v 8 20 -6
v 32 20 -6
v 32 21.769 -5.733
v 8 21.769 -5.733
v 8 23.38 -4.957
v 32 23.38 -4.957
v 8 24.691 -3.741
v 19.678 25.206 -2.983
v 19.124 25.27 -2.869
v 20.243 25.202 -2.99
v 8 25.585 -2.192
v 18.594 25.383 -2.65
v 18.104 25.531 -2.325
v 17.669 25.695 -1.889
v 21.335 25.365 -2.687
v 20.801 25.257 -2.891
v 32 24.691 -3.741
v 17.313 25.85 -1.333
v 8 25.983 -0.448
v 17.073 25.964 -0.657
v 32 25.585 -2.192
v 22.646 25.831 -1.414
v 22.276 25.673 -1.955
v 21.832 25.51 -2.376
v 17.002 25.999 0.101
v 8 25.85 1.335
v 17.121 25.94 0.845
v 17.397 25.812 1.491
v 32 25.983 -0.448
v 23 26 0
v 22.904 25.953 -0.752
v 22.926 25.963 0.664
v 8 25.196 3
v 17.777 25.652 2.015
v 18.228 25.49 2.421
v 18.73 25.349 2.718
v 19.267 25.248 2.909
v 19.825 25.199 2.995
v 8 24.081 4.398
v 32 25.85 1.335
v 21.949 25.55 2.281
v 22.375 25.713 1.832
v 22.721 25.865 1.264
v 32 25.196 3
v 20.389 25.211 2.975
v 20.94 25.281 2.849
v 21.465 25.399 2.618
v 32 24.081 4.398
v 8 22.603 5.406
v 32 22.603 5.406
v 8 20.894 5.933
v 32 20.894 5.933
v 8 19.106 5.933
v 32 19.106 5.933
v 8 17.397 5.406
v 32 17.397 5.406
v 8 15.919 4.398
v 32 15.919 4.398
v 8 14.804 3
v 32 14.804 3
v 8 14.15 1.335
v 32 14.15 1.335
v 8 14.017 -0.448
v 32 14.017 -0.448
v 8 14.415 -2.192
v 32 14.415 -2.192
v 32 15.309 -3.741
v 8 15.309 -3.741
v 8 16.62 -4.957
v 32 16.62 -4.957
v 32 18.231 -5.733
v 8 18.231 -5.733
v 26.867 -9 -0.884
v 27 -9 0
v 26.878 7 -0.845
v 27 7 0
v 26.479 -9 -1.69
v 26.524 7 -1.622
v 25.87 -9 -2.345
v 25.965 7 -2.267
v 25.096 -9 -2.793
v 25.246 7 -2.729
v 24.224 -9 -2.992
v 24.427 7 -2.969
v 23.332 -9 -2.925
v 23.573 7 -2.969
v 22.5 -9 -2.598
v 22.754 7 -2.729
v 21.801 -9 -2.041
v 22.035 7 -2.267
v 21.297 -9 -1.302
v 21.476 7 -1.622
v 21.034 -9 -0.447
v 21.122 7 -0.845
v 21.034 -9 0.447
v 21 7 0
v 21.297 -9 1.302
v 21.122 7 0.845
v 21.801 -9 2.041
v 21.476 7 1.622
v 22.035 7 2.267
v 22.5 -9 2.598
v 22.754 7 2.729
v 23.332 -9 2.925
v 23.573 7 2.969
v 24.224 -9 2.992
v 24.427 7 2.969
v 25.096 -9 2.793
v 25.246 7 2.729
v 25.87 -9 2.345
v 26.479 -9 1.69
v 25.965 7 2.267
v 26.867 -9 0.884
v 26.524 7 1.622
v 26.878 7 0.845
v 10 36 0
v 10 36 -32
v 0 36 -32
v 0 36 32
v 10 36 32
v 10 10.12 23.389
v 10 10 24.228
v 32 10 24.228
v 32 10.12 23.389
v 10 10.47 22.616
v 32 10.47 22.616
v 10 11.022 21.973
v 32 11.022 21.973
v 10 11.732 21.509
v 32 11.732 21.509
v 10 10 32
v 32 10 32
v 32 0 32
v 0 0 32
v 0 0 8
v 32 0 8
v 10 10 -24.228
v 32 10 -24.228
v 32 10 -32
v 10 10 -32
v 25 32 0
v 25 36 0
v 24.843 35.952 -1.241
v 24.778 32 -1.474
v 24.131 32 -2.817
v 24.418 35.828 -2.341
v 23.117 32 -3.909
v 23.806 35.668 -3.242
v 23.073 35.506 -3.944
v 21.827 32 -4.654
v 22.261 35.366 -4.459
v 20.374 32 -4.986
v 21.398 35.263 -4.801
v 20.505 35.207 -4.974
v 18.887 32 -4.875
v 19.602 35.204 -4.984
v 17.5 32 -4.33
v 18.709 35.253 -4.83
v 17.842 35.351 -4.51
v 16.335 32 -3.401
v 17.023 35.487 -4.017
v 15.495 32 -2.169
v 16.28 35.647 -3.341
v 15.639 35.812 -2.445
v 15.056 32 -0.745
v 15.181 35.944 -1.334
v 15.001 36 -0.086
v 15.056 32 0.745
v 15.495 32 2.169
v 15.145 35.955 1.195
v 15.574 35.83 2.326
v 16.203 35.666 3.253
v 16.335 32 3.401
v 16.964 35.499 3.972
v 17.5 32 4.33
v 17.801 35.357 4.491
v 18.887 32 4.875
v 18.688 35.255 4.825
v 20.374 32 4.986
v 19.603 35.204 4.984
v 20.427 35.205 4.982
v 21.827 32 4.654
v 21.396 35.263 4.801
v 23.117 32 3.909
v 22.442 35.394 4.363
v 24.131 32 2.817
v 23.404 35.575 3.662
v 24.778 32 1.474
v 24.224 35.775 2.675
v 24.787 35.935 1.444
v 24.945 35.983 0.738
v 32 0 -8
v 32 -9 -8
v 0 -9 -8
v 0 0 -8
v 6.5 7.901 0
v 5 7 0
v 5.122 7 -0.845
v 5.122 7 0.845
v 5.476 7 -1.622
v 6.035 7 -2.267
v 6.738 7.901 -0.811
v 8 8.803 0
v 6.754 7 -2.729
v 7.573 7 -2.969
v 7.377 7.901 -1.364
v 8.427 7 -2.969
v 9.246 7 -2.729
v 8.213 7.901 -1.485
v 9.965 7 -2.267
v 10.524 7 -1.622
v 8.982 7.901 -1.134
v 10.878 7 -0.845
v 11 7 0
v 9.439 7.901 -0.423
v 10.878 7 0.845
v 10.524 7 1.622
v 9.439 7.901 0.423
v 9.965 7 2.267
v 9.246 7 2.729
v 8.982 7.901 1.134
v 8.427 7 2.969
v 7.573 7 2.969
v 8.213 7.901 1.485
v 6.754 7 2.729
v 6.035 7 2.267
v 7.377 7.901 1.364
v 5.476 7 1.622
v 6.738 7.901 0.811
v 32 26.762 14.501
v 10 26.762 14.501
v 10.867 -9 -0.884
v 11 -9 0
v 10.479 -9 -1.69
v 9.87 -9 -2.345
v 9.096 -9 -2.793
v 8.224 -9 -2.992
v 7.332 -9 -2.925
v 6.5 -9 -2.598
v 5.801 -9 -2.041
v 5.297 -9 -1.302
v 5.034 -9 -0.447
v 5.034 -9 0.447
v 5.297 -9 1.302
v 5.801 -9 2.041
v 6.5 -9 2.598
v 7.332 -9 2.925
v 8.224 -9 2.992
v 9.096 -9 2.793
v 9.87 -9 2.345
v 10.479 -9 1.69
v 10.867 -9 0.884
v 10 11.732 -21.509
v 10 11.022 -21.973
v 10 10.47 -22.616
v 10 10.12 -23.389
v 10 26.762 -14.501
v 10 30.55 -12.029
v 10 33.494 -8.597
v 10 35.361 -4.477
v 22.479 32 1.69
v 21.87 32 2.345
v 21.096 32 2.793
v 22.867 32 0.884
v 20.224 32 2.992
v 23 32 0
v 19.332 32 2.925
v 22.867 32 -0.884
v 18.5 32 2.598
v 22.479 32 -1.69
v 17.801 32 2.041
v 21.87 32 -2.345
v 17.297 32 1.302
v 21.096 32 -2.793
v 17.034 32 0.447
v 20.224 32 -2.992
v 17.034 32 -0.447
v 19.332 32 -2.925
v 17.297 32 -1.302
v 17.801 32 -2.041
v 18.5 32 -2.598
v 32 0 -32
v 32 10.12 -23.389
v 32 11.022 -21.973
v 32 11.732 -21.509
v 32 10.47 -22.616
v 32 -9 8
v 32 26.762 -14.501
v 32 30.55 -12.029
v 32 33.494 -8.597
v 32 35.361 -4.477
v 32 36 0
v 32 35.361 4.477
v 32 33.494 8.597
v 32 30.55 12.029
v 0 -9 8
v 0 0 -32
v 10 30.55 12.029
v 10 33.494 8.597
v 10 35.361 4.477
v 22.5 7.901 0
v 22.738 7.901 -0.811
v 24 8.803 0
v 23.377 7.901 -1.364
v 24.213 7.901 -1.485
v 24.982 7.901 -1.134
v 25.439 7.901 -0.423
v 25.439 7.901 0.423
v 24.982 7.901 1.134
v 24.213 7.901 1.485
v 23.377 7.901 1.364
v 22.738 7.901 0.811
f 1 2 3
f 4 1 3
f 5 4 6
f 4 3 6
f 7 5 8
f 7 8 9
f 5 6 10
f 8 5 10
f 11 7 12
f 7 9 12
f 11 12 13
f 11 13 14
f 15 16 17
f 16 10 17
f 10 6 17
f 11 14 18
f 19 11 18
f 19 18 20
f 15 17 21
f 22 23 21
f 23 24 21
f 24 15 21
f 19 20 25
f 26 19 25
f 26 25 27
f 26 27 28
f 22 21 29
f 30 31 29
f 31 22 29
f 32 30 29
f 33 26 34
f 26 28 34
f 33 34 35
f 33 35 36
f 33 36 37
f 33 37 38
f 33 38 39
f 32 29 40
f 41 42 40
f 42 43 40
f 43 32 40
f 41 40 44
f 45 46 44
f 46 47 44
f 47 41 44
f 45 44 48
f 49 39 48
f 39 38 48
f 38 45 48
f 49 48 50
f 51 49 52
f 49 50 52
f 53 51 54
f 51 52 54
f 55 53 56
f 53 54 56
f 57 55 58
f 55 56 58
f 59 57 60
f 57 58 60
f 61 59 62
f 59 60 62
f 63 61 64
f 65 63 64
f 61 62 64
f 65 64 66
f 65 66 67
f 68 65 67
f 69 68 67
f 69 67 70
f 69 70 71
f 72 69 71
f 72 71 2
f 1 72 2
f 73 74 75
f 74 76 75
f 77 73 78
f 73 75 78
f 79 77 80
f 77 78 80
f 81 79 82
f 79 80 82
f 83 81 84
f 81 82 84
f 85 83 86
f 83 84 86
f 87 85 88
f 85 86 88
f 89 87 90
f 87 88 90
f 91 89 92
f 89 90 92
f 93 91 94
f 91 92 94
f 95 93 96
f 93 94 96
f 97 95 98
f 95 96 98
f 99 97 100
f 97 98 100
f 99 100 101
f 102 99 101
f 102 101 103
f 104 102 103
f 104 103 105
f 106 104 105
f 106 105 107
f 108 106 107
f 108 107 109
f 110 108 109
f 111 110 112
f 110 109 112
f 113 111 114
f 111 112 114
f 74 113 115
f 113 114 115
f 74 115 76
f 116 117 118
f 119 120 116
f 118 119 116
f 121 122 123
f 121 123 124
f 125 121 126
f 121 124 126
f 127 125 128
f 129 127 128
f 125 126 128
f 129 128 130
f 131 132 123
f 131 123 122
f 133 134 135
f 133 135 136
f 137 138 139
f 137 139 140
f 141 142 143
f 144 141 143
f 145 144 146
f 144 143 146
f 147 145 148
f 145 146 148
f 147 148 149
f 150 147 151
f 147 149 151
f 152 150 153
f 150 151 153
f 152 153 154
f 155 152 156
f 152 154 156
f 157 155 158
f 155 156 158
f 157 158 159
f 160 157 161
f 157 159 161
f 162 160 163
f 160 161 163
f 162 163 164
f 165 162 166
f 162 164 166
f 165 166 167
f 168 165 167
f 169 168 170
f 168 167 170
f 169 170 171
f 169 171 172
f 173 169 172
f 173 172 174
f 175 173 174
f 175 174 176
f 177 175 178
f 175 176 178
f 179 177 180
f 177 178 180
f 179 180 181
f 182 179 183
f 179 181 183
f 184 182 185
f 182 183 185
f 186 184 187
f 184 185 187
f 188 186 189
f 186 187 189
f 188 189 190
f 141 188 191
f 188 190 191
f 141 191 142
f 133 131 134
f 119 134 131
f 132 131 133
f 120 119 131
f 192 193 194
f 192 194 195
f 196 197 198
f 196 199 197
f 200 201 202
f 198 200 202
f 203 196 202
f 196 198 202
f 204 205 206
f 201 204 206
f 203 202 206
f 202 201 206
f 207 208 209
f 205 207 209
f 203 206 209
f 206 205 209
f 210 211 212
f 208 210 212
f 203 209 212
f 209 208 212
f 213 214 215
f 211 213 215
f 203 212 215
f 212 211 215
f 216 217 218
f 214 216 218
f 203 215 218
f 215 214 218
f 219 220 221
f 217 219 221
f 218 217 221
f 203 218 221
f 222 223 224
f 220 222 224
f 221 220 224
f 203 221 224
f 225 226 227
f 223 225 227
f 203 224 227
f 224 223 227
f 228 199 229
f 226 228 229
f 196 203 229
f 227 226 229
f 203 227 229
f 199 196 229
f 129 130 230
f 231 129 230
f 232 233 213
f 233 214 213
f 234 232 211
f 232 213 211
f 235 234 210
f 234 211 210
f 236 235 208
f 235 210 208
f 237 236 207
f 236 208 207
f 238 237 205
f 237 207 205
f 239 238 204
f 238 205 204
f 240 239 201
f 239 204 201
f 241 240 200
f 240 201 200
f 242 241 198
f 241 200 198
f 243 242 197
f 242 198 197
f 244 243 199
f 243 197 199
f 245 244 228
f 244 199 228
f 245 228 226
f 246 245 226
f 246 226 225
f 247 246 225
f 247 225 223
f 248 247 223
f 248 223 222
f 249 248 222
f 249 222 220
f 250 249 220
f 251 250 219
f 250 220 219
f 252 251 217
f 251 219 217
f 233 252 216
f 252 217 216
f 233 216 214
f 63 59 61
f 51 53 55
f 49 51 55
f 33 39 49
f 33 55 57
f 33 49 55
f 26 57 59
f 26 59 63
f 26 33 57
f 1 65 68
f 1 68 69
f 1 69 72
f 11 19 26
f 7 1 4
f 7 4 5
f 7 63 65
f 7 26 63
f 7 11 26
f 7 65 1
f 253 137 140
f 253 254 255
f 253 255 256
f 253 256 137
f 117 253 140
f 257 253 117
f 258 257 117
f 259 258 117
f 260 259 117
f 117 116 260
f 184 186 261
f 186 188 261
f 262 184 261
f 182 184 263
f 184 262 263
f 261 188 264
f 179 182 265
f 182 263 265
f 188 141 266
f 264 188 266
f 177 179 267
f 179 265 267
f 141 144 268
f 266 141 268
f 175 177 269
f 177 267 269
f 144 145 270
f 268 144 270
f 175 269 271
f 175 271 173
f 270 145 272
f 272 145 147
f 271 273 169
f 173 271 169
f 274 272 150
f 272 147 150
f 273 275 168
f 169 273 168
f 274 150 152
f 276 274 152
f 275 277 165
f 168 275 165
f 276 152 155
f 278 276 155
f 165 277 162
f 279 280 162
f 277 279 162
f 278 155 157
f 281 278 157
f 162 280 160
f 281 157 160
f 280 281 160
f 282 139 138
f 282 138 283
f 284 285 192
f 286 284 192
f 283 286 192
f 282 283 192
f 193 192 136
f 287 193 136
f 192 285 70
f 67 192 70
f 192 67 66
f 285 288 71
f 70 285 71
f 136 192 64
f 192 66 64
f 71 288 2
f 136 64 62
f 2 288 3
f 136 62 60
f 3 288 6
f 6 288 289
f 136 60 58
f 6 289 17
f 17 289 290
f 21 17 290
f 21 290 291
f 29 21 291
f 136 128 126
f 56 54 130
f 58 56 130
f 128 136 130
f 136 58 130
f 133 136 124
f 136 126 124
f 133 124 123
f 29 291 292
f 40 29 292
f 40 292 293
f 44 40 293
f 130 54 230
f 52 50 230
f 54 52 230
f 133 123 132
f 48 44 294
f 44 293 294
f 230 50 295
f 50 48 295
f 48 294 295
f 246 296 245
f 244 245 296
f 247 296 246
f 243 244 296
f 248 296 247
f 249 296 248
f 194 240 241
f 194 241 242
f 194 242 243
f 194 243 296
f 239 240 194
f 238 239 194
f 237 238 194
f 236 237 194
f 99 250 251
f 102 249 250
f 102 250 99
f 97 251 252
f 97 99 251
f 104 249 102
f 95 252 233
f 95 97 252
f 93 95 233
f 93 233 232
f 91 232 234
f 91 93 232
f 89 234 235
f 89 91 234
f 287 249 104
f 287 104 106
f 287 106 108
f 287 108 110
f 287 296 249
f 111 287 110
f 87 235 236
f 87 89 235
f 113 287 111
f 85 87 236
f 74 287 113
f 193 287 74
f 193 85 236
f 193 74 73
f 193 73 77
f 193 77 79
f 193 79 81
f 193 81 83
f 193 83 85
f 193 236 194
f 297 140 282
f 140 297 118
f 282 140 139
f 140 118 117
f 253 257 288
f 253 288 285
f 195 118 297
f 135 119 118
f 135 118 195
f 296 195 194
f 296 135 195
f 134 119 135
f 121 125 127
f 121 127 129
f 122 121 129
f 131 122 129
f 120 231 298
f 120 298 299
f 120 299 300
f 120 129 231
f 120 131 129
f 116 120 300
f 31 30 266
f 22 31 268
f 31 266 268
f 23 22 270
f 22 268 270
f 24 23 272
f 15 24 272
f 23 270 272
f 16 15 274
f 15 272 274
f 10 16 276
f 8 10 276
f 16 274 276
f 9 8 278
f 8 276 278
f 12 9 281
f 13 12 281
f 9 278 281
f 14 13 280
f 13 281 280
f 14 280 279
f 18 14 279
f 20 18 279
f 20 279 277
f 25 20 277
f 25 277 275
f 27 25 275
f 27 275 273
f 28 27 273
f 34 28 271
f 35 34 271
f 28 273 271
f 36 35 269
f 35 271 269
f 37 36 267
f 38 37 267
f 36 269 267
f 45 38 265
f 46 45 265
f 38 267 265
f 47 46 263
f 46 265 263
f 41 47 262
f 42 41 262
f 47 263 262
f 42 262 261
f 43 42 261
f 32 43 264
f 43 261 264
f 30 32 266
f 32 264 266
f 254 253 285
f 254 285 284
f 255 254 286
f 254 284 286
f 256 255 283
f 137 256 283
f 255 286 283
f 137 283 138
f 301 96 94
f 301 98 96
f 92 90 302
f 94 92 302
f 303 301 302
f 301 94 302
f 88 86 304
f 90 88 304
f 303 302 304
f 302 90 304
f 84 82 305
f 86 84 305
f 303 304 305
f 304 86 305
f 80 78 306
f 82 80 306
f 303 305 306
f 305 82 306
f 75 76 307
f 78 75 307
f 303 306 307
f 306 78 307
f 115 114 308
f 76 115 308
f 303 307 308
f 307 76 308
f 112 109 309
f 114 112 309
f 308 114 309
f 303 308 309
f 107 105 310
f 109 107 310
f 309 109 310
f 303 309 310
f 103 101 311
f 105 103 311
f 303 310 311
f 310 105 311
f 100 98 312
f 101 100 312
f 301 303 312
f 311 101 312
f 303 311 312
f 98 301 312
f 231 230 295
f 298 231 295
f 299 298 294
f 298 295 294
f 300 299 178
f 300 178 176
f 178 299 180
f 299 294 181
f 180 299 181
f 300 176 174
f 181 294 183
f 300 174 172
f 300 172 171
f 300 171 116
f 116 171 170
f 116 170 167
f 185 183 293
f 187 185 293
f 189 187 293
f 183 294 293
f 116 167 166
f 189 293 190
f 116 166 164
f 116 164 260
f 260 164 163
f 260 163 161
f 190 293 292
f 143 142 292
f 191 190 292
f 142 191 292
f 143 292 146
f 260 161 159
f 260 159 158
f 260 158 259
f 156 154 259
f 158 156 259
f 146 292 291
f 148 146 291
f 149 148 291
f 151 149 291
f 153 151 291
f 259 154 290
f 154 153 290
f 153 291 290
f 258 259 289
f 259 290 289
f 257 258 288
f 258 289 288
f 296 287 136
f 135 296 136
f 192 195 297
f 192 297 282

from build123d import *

# Parameters (mm, degrees)
BOSS_EXTRUDE1_DEPTH       = 32
BOSS_EXTRUDE2_REACH       = 59.827
SKETCH3_4_R               = 6
CUT_EXTRUDE1_DEPTH        = 24
SKETCH4_W                 = 16
SKETCH4_H                 = 9
BOSS_EXTRUDE3_DEPTH       = 32
F_6_0MM_DOWEL_HOLE1_D     = 6
F_6_0MM_DOWEL_HOLE1_DEPTH = 16
F_6_0MM_DOWEL_HOLE1_TIP   = 1.802581857


# Read off the part's stored shape, not the designer's step: CBORE for M5 Hex Head Bolt1
with BuildPart() as part:
    # Sketch1 → Boss-Extrude1 (new, symmetric)
    with BuildSketch(Plane.XY):
        Polygon((0, 36), (0, 0), (32, 0), (32, 10), (10, 10), (10, 36), align=None)
    extrude(amount=BOSS_EXTRUDE1_DEPTH, both=True)

    # Sketch3 → Boss-Extrude2 (add, up to next)
    with BuildSketch(Plane(origin=(32, 0, 0), x_dir=(0, 0, -1), z_dir=(1, 0, 0)), mode=Mode.PRIVATE) as boss_extrude2_sk1:
        with BuildLine():
            Line((14.500924593, 26.761892188), (21.509410706, 11.732145215))
            ThreePointArc((21.509410706, 11.732145215), (22.616435242, 10.469825663), (24.228334067, 10))
            Line((24.228334067, 10), (-24.228334067, 10))
            ThreePointArc((-24.228334067, 10), (-22.616435242, 10.469825663), (-21.509410706, 11.732145215))
            Line((-21.509410706, 11.732145215), (-14.500924593, 26.761892188))
            ThreePointArc((-14.500924593, 26.761892188), (0, 36), (14.500924593, 26.761892188))
        make_face()
    boss_extrude2_tool1 = extrude(boss_extrude2_sk1.sketch, amount=-BOSS_EXTRUDE2_REACH, mode=Mode.PRIVATE) - part.part
    add(boss_extrude2_tool1.solids().sort_by_distance((32, 20.8085, 0))[0])

    # Sketch3<4> → Cut-Extrude1 (cut)
    with BuildSketch(Plane(origin=(32, 0, 0), x_dir=(0, 0, -1), z_dir=(1, 0, 0))):
        with Locations((0, 20)):
            Circle(SKETCH3_4_R)
    extrude(amount=-CUT_EXTRUDE1_DEPTH, mode=Mode.SUBTRACT)

    # Sketch4 → Boss-Extrude3 (add)
    with BuildSketch(Plane(origin=(32, 0, 0), x_dir=(0, 0, -1), z_dir=(1, 0, 0))):
        with Locations((0, -4.5)):
            Rectangle(SKETCH4_W, SKETCH4_H)
    extrude(amount=-BOSS_EXTRUDE3_DEPTH)

    # Ø6.0mm Dowel Hole1
    with Locations(Plane(origin=(0, -9, 0), x_dir=(-1, 0, 0), z_dir=(0, -1, 0))):
        with Locations((-8, 0), (-24, 0)):
            Hole(F_6_0MM_DOWEL_HOLE1_D / 2, depth=F_6_0MM_DOWEL_HOLE1_DEPTH)
            with Locations((0, 0, -(F_6_0MM_DOWEL_HOLE1_DEPTH + F_6_0MM_DOWEL_HOLE1_TIP / 2))):  # 118° drill point
                Cone(0, F_6_0MM_DOWEL_HOLE1_D / 2, F_6_0MM_DOWEL_HOLE1_TIP, mode=Mode.SUBTRACT)

    # CBORE for M5 Hex Head Bolt1 outline → CBORE for M5 Hex Head Bolt1 (revolve, cut)
    with BuildSketch(Plane(origin=(20, 0, 0), x_dir=(1, 0, 0), z_dir=(0, 0, 1))):
        Polygon((0, 25.195854076), (3, 25.195854076), (3, 32), (5, 32), (5, 36.000103319), (0, 36.000103319), align=None)
    revolve(axis=Axis((20, 0, 0), (0, 1, 0)), mode=Mode.SUBTRACT)


solid = part.part
